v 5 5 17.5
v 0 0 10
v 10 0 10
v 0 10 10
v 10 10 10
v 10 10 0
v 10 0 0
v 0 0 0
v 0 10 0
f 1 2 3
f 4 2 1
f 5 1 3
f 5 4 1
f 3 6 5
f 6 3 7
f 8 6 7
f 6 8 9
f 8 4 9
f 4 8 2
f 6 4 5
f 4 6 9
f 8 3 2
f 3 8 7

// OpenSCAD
union(){
  polyhedron(points=[[0,0,10],[10,0,10],[0,10,10],[5,5,17.5]], triangles=[[0,1,2],[1,0,3],[0,2,3],[2,1,3]]);
  polyhedron(points=[[10,10,10],[10,0,10],[0,10,10],[5,5,17.5]], triangles=[[0,1,2], [1,0,3],[0,2,3],[2,1,3]]);
  cube(10,10,5);
}
